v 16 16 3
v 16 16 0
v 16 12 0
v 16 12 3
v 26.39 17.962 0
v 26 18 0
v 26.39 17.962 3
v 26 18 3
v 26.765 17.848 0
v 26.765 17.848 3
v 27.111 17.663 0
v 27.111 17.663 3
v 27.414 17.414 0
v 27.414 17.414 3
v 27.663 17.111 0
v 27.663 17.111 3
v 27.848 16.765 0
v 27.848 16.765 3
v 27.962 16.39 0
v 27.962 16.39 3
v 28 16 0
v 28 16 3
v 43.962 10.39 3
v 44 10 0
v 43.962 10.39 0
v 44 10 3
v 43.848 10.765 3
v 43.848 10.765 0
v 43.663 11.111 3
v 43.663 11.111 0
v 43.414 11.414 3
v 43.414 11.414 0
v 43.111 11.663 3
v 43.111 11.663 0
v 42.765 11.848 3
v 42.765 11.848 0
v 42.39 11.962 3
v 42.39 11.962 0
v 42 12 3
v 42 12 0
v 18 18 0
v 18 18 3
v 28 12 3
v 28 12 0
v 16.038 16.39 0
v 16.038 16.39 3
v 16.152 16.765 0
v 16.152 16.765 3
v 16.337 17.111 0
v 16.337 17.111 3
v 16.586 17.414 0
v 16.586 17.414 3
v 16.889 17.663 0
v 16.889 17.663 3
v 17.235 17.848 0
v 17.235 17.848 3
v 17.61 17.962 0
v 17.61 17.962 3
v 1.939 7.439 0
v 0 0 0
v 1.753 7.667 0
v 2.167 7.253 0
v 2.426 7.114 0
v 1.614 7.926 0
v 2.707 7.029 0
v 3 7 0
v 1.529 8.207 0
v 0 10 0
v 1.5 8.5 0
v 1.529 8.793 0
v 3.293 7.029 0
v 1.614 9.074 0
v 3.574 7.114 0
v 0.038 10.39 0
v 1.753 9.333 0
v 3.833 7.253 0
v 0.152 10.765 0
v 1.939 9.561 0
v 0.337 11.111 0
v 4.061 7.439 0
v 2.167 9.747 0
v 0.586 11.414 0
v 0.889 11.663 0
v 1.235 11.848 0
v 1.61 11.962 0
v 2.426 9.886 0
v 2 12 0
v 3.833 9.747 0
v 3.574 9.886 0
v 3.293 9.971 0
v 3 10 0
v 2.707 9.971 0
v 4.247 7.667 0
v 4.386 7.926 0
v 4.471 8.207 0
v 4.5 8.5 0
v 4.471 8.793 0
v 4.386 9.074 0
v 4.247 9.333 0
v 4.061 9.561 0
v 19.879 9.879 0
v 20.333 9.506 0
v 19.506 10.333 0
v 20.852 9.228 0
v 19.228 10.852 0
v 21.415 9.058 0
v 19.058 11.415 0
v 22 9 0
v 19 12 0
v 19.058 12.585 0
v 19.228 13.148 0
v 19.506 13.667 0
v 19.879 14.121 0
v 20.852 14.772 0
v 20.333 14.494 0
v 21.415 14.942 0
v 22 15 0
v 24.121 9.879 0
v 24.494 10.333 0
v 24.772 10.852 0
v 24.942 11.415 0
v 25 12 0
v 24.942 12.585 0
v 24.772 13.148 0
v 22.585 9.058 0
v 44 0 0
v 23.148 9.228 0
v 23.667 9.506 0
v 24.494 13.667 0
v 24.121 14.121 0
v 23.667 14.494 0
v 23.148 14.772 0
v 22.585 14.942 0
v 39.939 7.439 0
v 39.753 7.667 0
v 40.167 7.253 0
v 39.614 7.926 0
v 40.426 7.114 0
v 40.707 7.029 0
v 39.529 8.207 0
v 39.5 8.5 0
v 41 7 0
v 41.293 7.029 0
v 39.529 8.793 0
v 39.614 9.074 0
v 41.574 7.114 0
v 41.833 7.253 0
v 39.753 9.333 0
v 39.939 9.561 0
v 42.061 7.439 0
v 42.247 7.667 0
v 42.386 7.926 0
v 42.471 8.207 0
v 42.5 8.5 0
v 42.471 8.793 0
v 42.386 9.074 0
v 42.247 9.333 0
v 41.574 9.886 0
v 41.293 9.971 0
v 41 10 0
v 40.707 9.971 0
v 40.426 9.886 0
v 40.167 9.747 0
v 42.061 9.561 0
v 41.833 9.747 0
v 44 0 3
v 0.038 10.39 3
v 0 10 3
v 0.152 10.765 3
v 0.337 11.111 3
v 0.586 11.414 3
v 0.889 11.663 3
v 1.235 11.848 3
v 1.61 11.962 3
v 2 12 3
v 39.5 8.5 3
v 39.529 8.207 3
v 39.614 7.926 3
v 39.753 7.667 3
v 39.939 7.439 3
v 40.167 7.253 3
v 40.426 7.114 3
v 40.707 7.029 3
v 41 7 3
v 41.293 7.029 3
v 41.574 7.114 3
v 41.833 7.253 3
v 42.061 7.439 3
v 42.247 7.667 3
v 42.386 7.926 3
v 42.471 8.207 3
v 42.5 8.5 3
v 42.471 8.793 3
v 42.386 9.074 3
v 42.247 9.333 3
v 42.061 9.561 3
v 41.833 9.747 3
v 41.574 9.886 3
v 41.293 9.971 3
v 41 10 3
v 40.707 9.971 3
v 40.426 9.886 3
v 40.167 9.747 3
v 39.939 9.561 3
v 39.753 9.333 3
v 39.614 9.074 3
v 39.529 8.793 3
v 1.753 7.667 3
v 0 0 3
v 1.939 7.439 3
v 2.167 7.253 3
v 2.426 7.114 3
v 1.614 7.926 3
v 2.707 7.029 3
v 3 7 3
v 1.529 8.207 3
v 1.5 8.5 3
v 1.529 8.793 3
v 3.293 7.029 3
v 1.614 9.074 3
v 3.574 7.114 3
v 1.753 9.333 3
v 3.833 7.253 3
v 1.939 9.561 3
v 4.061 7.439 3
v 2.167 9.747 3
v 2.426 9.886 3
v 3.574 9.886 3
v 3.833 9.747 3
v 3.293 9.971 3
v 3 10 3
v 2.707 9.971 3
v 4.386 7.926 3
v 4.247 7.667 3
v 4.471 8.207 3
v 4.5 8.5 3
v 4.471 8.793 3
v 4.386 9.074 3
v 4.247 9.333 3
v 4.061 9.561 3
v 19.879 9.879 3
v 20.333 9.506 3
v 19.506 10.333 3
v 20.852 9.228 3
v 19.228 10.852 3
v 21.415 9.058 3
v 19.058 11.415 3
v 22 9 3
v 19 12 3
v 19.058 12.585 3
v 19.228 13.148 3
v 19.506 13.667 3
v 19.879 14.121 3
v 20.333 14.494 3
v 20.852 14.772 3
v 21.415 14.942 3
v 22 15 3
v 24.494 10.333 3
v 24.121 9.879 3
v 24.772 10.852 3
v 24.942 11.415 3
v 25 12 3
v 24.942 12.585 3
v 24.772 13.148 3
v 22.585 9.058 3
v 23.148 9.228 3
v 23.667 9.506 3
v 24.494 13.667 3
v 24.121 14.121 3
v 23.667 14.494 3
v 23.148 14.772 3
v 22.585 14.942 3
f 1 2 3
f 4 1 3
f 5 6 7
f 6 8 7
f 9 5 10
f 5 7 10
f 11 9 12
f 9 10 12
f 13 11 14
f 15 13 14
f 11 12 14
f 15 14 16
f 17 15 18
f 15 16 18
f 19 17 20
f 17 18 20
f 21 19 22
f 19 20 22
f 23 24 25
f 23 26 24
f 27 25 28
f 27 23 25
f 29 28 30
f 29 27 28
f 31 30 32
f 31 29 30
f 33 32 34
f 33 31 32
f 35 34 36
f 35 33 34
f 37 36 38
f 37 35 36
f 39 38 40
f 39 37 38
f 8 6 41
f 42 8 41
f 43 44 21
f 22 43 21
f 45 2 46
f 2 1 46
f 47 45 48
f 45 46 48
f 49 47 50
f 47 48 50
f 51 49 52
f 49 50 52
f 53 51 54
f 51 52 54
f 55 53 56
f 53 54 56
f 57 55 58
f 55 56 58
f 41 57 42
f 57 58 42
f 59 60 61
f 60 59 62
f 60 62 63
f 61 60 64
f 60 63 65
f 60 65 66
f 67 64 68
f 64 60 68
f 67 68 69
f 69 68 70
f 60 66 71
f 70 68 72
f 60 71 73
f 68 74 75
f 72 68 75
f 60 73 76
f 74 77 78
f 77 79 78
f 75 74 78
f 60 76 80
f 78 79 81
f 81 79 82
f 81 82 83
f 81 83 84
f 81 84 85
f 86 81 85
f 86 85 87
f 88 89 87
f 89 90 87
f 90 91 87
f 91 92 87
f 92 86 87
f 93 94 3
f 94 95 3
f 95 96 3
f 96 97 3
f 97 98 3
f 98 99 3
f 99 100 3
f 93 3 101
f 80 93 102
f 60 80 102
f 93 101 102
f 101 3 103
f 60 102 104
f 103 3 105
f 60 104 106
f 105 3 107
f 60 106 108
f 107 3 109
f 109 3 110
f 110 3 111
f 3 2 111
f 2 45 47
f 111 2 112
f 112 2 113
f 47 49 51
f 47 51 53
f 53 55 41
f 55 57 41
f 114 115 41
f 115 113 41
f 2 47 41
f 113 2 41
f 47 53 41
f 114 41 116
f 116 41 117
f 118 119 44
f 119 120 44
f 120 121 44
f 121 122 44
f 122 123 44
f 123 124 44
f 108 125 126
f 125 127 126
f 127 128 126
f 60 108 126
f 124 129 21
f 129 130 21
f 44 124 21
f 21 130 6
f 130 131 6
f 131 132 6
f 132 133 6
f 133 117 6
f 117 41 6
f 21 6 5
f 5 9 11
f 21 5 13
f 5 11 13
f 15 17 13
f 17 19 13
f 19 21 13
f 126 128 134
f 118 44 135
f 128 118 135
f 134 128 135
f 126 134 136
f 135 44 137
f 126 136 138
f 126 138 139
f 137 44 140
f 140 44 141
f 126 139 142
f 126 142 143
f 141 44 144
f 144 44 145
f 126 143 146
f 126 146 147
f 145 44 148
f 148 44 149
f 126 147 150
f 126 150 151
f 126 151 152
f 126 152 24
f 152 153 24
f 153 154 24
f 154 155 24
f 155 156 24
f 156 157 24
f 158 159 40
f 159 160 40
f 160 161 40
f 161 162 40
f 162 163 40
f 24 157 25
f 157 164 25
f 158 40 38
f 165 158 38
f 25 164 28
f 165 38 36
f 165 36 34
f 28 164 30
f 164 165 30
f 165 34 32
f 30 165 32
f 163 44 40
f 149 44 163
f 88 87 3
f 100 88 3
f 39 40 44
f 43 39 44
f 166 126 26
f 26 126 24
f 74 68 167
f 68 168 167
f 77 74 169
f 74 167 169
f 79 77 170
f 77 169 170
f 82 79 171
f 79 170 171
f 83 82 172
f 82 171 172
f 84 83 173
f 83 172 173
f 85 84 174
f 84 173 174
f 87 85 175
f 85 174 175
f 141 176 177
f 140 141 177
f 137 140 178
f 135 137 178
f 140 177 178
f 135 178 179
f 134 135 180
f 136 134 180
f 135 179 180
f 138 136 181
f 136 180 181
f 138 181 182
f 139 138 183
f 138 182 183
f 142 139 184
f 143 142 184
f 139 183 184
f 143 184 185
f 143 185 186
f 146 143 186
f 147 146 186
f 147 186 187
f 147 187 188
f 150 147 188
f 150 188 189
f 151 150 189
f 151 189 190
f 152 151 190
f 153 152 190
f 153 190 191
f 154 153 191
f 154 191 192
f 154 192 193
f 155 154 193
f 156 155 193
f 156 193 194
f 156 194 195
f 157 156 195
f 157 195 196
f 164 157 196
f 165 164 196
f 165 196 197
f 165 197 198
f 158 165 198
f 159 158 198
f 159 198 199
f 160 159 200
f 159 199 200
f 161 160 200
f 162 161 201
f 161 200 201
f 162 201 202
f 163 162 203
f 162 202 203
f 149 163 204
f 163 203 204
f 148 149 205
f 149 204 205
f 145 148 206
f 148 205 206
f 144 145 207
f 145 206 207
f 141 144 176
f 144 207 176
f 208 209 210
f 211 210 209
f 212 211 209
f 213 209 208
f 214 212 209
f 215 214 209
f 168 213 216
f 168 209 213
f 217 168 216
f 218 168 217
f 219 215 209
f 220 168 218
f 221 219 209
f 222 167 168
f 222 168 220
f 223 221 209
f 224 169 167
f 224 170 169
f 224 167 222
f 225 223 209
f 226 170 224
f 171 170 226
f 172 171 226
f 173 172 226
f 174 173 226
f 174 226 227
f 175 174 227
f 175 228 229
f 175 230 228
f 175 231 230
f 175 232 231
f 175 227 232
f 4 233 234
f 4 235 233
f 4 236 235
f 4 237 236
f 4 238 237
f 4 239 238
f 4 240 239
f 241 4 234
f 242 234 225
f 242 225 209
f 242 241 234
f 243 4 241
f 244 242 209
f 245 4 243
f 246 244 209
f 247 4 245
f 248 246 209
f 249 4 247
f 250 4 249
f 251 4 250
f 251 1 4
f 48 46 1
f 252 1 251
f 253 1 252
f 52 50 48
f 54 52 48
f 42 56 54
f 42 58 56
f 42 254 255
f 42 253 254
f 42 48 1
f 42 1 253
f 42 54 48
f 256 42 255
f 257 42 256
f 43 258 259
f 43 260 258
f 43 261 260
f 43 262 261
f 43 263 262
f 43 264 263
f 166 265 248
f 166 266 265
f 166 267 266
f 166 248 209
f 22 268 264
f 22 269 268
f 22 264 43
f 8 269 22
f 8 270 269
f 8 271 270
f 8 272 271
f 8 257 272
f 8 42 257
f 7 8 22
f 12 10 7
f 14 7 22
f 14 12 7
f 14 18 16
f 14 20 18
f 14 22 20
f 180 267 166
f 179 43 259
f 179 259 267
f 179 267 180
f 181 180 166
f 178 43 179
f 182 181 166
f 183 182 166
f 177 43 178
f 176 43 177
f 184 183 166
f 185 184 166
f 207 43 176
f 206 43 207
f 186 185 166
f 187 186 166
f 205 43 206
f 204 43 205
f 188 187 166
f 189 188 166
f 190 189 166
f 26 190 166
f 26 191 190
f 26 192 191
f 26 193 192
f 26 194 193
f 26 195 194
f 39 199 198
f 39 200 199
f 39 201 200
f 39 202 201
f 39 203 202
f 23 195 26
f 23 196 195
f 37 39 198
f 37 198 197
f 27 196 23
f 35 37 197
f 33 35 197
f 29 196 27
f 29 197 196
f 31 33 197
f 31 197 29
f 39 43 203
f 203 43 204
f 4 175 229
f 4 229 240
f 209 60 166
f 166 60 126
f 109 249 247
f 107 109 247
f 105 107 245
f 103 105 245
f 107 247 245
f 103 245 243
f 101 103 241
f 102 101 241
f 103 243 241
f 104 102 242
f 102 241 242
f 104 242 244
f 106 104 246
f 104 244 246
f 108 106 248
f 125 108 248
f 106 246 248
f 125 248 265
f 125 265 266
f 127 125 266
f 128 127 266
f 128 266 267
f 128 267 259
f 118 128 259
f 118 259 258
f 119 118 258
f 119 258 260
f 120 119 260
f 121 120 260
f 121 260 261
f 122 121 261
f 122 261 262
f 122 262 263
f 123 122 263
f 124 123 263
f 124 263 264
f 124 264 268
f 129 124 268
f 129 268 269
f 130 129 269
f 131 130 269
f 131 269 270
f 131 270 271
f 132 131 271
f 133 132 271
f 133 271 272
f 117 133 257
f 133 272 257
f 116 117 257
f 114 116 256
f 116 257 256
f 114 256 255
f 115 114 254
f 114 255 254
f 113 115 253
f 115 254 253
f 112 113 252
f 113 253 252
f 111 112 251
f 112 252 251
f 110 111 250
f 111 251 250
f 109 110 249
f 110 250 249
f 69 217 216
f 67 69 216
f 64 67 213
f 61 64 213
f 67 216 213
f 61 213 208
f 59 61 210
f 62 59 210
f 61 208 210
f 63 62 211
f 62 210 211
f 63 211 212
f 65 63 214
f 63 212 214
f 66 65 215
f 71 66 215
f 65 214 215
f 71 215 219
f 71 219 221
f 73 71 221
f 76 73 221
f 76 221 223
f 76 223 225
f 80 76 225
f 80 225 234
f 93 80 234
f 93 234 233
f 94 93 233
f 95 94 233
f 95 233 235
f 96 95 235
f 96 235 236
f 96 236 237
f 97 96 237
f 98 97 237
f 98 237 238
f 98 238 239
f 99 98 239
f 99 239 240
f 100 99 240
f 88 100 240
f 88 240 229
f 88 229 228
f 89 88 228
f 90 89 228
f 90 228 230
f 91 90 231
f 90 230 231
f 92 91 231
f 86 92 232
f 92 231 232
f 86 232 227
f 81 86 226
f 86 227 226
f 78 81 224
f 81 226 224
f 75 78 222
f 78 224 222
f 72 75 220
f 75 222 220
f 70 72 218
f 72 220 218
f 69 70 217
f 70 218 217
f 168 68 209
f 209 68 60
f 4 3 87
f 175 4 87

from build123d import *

# Parameters (mm, degrees)
F1_DEPTH = 3
F2_D     = 6
F3_D     = 3
F4_R     = 2


with BuildPart() as f1:
    # F0 (on Top) → F1 (new body)
    with BuildSketch(Plane.XY):
        Polygon((0, 12), (0, 0), (44, 0), (44, 12), (28, 12), (28, 18), (16, 18), (16, 12), align=None)
    extrude(amount=F1_DEPTH)

    # F2 (through all)
    with Locations(Plane(origin=(0, 0, 0), x_dir=(1, 0, 0), z_dir=(0, 0, -1))):
        with Locations((22, -12)):
            Hole(F2_D / 2)

    # F3 (through all)
    with Locations(Plane(origin=(0, 0, 0), x_dir=(1, 0, 0), z_dir=(0, 0, -1))):
        with Locations((3, -8.5), (41, -8.5)):
            Hole(F3_D / 2)

    # F4
    f4_edges = [f1.edges().sort_by_distance(p)[0] for p in [
        (28, 18, 1.5),
        (16, 18, 1.5),
        (44, 12, 1.5),
        (0, 12, 1.5),
    ]]
    fillet(f4_edges, radius=F4_R)


solid = f1.part
